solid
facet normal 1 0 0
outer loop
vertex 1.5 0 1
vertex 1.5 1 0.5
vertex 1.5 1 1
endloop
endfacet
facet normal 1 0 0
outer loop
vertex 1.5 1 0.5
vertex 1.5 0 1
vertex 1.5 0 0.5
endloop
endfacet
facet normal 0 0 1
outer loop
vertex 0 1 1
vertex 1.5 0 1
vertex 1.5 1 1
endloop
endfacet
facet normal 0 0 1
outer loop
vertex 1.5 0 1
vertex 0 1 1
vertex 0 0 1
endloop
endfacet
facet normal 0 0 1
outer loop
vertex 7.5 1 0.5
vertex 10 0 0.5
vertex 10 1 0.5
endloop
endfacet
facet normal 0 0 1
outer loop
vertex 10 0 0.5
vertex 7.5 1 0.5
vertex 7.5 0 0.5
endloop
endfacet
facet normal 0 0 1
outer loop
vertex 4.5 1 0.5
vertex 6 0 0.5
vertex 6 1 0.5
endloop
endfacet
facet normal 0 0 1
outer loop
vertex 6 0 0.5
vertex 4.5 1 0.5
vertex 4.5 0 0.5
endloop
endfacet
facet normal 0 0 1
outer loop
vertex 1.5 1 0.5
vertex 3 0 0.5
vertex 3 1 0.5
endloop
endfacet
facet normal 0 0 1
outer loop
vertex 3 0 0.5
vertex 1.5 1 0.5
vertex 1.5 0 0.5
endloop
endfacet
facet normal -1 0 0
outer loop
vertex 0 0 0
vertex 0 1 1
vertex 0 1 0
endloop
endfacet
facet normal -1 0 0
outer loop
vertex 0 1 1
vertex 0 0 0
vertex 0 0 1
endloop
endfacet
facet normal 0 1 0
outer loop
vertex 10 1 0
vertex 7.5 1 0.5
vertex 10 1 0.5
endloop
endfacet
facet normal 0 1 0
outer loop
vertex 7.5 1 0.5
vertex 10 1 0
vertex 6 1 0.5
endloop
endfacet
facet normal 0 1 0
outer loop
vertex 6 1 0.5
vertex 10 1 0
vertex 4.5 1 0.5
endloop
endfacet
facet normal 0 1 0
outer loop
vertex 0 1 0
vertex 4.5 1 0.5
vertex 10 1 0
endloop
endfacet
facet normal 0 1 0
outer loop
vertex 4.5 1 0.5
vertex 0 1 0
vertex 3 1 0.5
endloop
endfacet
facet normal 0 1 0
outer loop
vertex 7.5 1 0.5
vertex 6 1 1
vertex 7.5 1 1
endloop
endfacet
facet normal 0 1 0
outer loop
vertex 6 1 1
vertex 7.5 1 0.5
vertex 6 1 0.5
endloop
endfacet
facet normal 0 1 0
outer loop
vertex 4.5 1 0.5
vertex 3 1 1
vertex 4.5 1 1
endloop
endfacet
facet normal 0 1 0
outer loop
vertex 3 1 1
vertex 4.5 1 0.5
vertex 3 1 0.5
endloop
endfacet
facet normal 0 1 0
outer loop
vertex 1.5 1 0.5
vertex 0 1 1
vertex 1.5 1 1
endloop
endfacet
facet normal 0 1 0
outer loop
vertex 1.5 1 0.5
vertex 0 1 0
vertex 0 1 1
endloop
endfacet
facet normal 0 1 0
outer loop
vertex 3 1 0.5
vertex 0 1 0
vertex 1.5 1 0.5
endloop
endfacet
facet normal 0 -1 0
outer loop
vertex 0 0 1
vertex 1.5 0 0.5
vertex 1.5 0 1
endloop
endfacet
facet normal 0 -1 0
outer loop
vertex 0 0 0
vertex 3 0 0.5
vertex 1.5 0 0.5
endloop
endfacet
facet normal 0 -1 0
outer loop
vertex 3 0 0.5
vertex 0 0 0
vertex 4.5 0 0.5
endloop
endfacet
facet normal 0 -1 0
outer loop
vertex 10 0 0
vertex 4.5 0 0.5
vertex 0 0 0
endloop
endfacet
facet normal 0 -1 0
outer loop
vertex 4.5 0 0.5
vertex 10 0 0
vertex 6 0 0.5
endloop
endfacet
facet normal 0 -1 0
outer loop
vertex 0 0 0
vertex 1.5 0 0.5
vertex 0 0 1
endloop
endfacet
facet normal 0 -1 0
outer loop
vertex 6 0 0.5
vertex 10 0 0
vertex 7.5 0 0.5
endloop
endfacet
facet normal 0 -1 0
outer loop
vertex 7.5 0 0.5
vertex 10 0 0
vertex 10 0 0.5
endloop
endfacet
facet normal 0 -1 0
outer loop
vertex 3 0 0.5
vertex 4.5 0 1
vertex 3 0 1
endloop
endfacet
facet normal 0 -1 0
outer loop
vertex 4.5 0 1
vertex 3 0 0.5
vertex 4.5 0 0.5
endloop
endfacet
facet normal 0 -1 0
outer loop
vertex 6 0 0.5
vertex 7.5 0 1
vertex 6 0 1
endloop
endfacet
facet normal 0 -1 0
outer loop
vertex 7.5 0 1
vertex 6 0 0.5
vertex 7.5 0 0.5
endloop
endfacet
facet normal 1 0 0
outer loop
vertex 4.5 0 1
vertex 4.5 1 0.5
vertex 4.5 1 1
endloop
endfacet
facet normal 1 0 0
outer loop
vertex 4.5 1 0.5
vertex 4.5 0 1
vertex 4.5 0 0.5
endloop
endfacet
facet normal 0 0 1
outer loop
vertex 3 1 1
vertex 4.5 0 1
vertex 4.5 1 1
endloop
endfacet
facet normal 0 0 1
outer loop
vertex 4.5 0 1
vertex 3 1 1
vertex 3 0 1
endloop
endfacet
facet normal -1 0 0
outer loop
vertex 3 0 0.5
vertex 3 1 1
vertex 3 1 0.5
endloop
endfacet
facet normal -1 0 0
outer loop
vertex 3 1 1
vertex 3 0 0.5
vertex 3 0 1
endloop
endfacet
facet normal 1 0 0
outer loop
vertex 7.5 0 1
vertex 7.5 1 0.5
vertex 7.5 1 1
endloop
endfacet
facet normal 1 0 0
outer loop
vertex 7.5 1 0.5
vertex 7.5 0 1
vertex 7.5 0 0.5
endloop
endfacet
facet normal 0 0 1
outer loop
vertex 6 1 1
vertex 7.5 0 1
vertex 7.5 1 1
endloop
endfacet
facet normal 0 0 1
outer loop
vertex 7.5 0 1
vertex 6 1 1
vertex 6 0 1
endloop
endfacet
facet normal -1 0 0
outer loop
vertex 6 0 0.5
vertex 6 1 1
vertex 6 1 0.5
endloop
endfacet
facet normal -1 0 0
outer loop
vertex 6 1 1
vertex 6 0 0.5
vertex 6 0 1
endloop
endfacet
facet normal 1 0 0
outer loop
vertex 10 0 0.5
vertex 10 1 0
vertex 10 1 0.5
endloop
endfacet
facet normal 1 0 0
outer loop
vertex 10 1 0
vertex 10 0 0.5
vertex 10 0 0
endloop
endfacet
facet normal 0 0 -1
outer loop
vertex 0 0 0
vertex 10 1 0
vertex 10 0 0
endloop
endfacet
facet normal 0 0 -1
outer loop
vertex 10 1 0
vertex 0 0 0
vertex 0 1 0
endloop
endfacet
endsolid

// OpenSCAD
// Size in XYZ, alt W, step-size
module raftSlice(Sz){
    x = Sz[0];
    y = Sz[1];
    z = Sz[2];
    //steps =Sz[3];
    
    //Constant steps
    /*
    steps = 10;
    stride = x/steps;
    // */
    
    //Constant Stride
    // /*
    stride = 3;
    steps = x/stride;
    
    // */
    union(){
    for(i = [1:steps]){
        /* //Y-hopps
        for( j = [1:x*steps
        
        */
        translate([(i-1)*stride,0,0]){
            cube([stride/2,y,z]);
        }
    }
    }
    
}


module raft(Sz){
    x = Sz[0];
    y = Sz[1];
    z = Sz[2];
    union(){
        cube([x,y,z/2]);
        translate([0,0,z/2]){
            raftSlice([x,y,z/2]);
        }
    }
}
raft([10,1,1]);
